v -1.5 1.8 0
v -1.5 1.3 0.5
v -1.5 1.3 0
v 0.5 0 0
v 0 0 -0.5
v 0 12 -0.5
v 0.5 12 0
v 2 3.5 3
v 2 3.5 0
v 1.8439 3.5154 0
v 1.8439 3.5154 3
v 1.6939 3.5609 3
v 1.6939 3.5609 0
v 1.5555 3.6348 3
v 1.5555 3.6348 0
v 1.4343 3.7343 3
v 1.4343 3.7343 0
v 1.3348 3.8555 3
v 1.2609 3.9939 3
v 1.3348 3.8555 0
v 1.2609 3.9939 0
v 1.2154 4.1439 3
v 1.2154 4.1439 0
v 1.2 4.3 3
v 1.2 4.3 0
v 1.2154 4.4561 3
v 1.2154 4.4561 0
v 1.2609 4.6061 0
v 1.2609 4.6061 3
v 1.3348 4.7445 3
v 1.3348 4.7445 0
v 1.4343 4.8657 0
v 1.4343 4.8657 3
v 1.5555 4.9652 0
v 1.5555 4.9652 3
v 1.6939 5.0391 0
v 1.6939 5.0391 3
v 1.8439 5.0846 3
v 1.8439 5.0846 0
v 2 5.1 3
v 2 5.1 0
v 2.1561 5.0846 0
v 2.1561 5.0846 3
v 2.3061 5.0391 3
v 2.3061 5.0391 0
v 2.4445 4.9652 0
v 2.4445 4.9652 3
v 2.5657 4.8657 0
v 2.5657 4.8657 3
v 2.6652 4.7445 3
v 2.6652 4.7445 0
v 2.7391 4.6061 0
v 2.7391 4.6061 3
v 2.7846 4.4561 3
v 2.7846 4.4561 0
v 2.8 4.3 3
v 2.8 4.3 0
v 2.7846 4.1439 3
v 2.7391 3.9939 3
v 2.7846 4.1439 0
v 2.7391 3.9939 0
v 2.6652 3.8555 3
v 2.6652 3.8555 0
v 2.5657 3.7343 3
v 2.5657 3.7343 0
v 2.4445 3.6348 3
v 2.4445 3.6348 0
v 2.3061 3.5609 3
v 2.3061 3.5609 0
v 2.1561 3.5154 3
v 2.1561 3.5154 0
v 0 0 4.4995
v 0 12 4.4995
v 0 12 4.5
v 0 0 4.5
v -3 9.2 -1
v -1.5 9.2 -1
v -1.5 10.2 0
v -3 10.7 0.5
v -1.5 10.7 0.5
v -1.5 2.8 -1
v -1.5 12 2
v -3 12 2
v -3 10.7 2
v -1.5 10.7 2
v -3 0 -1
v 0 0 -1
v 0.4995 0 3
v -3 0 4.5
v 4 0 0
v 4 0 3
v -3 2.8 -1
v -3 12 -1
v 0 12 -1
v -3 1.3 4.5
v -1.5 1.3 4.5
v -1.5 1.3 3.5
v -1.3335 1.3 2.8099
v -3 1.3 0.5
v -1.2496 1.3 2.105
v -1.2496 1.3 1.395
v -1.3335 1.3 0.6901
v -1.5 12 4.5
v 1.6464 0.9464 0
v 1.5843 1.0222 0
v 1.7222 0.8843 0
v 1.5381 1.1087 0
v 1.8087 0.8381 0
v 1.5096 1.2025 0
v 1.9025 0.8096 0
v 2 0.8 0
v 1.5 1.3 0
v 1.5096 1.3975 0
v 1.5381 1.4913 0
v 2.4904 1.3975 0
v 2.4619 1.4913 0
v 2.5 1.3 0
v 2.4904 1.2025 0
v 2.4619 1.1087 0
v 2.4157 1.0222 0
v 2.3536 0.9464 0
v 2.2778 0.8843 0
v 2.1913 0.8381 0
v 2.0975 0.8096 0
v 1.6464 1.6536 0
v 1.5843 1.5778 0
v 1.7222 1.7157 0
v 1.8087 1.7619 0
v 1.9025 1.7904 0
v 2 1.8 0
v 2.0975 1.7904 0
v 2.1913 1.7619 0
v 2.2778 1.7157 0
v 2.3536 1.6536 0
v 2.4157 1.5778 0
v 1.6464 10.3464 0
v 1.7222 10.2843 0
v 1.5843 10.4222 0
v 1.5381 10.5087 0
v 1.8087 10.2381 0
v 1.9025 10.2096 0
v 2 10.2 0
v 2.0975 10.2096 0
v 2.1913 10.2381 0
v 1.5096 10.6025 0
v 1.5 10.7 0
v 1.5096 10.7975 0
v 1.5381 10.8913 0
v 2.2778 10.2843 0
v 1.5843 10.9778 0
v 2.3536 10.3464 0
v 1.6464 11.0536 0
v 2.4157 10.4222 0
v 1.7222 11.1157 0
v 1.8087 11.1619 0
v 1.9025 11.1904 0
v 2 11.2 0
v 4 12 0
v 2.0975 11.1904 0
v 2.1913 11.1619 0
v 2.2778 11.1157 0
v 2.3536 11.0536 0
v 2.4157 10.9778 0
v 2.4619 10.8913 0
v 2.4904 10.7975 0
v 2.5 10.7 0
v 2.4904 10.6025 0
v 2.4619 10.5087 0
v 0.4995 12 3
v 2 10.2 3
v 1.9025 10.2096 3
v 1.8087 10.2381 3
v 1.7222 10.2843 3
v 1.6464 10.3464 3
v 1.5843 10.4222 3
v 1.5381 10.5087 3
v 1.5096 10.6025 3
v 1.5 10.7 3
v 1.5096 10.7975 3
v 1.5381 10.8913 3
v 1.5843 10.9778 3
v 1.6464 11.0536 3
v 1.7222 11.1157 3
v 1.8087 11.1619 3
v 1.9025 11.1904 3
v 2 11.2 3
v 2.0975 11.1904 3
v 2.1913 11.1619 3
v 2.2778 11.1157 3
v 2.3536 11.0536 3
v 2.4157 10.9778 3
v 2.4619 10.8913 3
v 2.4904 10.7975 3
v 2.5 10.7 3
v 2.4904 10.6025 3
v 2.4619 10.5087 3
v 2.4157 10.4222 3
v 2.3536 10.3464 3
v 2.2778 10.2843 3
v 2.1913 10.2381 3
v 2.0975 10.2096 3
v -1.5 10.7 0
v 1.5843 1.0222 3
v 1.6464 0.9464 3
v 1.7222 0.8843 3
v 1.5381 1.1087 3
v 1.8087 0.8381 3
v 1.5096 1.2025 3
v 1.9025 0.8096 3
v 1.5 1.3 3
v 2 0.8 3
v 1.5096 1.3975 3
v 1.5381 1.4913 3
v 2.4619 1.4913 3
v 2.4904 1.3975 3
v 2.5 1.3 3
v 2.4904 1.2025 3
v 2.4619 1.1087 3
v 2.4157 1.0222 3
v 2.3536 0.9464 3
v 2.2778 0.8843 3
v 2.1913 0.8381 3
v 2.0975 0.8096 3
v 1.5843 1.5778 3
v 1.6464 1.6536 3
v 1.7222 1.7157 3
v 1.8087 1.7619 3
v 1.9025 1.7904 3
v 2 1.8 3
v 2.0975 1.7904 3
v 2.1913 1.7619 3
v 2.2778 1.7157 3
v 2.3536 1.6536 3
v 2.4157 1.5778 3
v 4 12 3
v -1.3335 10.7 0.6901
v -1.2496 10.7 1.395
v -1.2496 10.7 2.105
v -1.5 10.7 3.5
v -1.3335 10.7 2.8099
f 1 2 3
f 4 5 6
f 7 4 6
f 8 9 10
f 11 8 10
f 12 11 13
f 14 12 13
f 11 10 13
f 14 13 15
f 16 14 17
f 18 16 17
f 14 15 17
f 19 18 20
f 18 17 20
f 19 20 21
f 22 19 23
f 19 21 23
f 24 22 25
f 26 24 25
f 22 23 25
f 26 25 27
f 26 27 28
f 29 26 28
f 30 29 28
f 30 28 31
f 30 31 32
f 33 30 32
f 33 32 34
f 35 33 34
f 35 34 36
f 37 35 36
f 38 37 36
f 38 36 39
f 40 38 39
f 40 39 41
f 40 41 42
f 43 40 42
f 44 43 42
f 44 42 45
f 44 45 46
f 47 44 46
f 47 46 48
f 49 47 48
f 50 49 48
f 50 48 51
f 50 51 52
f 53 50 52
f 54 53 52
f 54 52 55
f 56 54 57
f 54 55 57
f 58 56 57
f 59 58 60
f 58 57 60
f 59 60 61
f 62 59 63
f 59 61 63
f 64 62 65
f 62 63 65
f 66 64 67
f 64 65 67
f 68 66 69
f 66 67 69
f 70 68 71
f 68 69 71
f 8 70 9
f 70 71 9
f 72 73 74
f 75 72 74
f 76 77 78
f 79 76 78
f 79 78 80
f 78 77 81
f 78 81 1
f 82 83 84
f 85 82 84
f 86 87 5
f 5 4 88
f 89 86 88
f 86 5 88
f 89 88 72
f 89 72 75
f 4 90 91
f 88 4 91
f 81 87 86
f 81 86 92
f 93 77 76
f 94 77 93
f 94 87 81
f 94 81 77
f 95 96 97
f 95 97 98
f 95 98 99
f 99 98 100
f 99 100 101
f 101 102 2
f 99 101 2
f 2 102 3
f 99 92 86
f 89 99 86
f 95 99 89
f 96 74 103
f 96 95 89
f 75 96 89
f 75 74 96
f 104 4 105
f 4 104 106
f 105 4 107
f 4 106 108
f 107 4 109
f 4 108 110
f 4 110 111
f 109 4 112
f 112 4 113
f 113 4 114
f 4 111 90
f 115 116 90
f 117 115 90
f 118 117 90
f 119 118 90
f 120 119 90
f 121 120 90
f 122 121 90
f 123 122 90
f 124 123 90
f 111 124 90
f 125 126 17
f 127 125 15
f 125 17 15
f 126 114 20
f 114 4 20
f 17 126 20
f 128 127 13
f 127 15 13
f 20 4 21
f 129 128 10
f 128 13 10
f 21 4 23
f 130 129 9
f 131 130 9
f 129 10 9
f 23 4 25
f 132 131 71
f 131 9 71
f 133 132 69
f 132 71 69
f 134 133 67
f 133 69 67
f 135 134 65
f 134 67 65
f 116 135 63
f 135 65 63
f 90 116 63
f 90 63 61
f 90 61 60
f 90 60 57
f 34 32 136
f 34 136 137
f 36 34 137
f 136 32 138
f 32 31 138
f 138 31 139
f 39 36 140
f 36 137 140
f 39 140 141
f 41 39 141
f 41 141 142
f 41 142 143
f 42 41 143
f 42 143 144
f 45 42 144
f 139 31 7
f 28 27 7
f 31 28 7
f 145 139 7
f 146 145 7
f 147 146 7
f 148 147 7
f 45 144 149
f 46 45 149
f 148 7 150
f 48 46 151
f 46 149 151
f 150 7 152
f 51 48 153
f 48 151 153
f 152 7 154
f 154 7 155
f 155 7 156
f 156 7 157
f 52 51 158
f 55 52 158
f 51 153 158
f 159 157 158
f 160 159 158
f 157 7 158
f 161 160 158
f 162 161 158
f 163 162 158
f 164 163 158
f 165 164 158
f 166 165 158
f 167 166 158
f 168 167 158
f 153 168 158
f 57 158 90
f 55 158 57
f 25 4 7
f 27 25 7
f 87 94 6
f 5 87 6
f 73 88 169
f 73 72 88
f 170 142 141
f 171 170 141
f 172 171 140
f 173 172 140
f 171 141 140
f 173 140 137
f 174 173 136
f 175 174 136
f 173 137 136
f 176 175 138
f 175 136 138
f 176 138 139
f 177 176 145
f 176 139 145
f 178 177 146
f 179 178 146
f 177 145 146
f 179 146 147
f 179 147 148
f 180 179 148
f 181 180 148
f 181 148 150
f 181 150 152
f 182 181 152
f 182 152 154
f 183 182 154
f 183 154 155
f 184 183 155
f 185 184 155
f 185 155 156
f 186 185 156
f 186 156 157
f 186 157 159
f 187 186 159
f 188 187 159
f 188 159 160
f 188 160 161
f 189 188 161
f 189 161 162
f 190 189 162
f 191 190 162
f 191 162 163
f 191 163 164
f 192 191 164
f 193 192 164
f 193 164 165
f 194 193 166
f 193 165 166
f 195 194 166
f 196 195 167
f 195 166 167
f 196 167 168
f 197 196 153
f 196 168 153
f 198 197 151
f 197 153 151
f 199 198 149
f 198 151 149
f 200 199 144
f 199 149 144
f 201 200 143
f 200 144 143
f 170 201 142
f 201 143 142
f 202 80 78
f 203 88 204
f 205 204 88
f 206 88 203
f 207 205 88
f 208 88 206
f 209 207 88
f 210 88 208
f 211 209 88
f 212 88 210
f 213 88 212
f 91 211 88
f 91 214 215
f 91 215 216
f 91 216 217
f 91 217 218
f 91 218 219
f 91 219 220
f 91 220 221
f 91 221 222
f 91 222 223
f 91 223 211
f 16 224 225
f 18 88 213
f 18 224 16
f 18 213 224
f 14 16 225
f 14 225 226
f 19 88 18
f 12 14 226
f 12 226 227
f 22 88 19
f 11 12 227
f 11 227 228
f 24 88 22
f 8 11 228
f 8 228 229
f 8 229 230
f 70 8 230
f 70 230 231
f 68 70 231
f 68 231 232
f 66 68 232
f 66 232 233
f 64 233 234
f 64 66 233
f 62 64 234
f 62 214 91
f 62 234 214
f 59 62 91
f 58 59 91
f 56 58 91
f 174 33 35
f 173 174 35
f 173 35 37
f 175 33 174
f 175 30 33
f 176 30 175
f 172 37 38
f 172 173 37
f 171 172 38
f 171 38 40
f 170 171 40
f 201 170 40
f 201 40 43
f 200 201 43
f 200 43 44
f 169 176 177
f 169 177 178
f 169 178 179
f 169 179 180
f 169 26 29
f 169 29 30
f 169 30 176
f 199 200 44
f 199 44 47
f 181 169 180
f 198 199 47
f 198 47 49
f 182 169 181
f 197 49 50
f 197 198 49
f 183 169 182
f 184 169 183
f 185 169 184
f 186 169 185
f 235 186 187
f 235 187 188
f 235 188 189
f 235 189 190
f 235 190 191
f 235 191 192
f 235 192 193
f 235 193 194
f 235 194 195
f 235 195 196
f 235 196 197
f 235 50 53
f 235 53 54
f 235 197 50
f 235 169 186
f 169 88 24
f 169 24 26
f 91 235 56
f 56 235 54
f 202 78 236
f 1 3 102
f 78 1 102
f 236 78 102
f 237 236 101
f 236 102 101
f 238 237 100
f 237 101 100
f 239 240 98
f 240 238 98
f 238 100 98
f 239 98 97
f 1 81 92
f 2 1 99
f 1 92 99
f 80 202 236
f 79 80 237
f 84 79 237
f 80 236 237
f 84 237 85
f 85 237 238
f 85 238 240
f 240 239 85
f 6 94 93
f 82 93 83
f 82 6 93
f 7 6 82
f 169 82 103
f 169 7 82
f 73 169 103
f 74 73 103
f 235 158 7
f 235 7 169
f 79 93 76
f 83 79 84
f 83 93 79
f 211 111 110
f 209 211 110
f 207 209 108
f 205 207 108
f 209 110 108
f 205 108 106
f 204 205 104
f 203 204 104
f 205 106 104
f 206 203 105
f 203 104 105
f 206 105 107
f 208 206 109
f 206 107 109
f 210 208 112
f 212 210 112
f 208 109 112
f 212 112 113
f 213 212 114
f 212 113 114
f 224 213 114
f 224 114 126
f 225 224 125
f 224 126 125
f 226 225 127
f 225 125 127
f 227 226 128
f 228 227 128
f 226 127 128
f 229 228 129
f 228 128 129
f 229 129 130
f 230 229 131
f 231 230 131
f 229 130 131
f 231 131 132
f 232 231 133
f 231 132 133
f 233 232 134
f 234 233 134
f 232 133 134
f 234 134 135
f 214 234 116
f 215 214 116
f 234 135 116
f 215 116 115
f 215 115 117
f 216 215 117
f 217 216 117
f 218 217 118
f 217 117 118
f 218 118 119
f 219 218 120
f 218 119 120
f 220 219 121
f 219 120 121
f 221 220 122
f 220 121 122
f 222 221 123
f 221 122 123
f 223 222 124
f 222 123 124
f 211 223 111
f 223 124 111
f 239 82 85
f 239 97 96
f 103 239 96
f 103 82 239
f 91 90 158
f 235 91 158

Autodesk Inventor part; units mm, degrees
ref_plane "YZ Plane" through (0, 0, 0) normal (1, 0, 0) x (0, 1, 0)
ref_plane "XZ Plane" through (0, 0, 0) normal (0, 1, 0) x (-1, 0, 0)
ref_plane "XY Plane" through (0, 0, 0) normal (0, 0, 1) x (1, 0, 0)
sketch "스케치1" plane through (0, 0, 0) normal (0, 0, 1) x (1, 0, 0)
  line L0 (0, 0) -> (4, 0)
  line L1 (4, 0) -> (4, 12)
  line L2 (4, 12) -> (0, 12)
  line L3 (0, 12) -> (0, 0)
  dimension "d0" = 4
  dimension "d1" = 12
extrude "돌출1" add sketch "스케치1" along normal blind 3
sketch "스케치2" plane through (0, 0, 3) normal (0, 0, 1) x (1, 0, 0)
  line L0 (4, 12) -> (0, 12) construction
  line L1 (2, 12) -> (2, 0) construction
  line L2 (0, 0) -> (4, 0) construction
  line L3 (4, 0) -> (4, 12) projected
  line L4 (0, 12) -> (0, 0) projected
  point P0 (2, 7.7)
  point P1 (2, 4.3)
  point P2 (2, 1.3)
  point P3 (2, 10.7)
  dimension "d9" = 4.3
  dimension "d45" = 1.3
  dimension "d51" = 3.4
  dimension "d52" = 3
  dimension "d55" = 1.3
hole "구멍2" at (2, 4.3, 3) direction (0, 0, -1) diameter 1.6 end through all
hole "구멍3" at (2, 1.3, 3) at (2, 10.7, 3) direction (0, 0, -1) diameter 1 end through all
sketch "스케치5" plane through (0, 0, 0) normal (-1, 0, 0) x (0, 0, 1)
  line L0 (0, 12) -> (0, 0) projected
  line L1 (0, 0) -> (3, 0) projected
  line L2 (3, 12) -> (3, 0) projected
  line L3 (0, 12) -> (3, 12) projected
  line L4 (-1, 12) -> (4.5, 12)
  line L5 (4.5, 12) -> (4.5, 0)
  line L6 (4.5, 0) -> (-1, 0)
  line L7 (-1, 0) -> (-1, 12)
  line L8 (0, 0) -> (3, 0) projected
  dimension "d62" = 4.5
  dimension "d71" = 1
extrude "돌출5" add sketch "스케치5" along normal blind 2
sketch "스케치6" plane through (-2, 0, 0) normal (-1, 0, 0) x (0, 0, 1)
  line L0 (4.5, 0) -> (4.5, 12) projected
  line L1 (-1, 12) -> (-1, 0) projected
  line L2 (-1, 0) -> (4.5, 0) projected
  line L3 (4.5, 0) -> (4.5, 12) projected
  line L4 (4.5, 12) -> (-1, 12)
  line L5 (-1, 12) -> (-1, 10.7)
  line L6 (-1, 10.7) -> (4.5, 10.7)
  line L7 (4.5, 10.7) -> (4.5, 12)
  line L8 (-1, 12) -> (-1, 0) projected
  line L9 (-1, 0) -> (4.5, 0)
  line L10 (4.5, 0) -> (4.5, 1.3)
  line L11 (4.5, 1.3) -> (-1, 1.3)
  line L12 (-1, 1.3) -> (-1, 0)
  line L13 (-1, 12) -> (-1, 0) projected
  line L14 (-1, 9.2) -> (0.5, 10.7)
  line L15 (-1, 2.8) -> (0.5, 1.3)
  line L16 (4.5, 12) -> (-1, 12) projected
  point P0 (-1, 1.3)
  point P1 (4.5, 10.7)
  point P2 (-1, 12)
  dimension "d72" = 9.4
  dimension "d74" = 1.3
  dimension "d78" = 1.5
  dimension "d79" = 45
  dimension "d80" = 45
extrude "돌출6" add sketch "스케치6" along normal blind 1 contours L2 L1 L11 L0 | L6 L1 L4 L0 | L11 L1 L15 | L14 L1 L6
chamfer "모따기2" distance 0.5 angle 45 1 edges at (0, 6, 0)
sketch "스케치7" plane through (-2, 0, 0) normal (-1, 0, 0) x (0, 0, 1)
  line L0 (-1, 2.8) -> (0.5, 1.3) projected
  line L1 (0.5, 1.3) -> (4.5, 1.3) projected
  line L2 (4.5, 1.3) -> (4.5, 10.7) projected
  line L3 (4.5, 10.7) -> (0.5, 10.7) projected
  line L4 (0.5, 10.7) -> (-1, 9.2) projected
  line L5 (-1, 9.2) -> (-1, 2.8) projected
extrude "돌출7" cut sketch "스케치7" against normal blind 0.5
sketch "스케치8" plane through (-3, 1.3, 4.5) normal (0, 1, 0) x (1, 0, 0)
  line L0 (1.5, 4) -> (1.5, 0) projected
  arc A0 (1.5, 1) -> (1.5, 4.5) centre (-4.2391, 2.75) ccw
  line L1 (7, 4.5) -> (3.5, 4.5) projected
  line L2 (3, 5) -> (3.5, 4.5) projected
  line L3 (3, 5.5) -> (0, 5.5) projected
  line L4 (3, 0) -> (0, 0) projected
  line L5 (7, 1.5) -> (3, 1.5) projected
  line L6 (7, 4.5) -> (7, 1.5) projected
  line L7 (1.5, 1) -> (1.5, 4.5)
  line L8 (1.5, 4) -> (1.5, 5.5) projected
  line L9 (0, 0) -> (0, 5.5) projected
  line L10 (3, 5) -> (3, 5.5) projected
  line L11 (3, 0) -> (3, 1.5) projected
  point P0 (3, 4.5)
  point P1 (1.5, 4)
  dimension "d84" = 6
extrude "돌출8" cut sketch "스케치8" along normal up to surface (9.4 mm away) contours L7 A0 L0
chamfer "모따기3" distance 0.5 distance2 1.5 1 edges at (0, 6, 3) measured on face at (3.5981, 5.4655, 3)
sketch "스케치9" plane through (-3, 0, 0) normal (-1, 0, 0) x (0, 0, 1)
  line L0 (-1, 12) -> (-1, 9.2) projected
  line L1 (-1, 9.2) -> (0.5, 10.7) projected
  line L2 (0.5, 10.7) -> (4.5, 10.7) projected
  line L3 (4.5, 0) -> (4.5, 1.3) projected
  line L4 (2, 12) -> (2, 10.7)
  line L5 (0.5, 10.7) -> (4.5, 10.7) projected
  line L6 (-1, 0) -> (4.5, 0) projected
  line L7 (4.5, 1.3) -> (0.5, 1.3) projected
  line L8 (0.5, 1.3) -> (-1, 2.8) projected
  line L9 (-1, 2.8) -> (-1, 0) projected
  line L10 (4.5, 12) -> (-1, 12) projected
  line L11 (4.5, 10.7) -> (4.5, 12) projected
  point P0 (0, 0)
  dimension "d91" = 2.5
extrude "돌출9" cut sketch "스케치9" against normal up to surface (1.5 mm away) contours L10 L11 L2 L4
equation "\"d80\" = d79"
equation "\"G23_M\" = 0.67"
equation "\"G23_F\" = 0.65"
properties part number "Top" material "유리"
